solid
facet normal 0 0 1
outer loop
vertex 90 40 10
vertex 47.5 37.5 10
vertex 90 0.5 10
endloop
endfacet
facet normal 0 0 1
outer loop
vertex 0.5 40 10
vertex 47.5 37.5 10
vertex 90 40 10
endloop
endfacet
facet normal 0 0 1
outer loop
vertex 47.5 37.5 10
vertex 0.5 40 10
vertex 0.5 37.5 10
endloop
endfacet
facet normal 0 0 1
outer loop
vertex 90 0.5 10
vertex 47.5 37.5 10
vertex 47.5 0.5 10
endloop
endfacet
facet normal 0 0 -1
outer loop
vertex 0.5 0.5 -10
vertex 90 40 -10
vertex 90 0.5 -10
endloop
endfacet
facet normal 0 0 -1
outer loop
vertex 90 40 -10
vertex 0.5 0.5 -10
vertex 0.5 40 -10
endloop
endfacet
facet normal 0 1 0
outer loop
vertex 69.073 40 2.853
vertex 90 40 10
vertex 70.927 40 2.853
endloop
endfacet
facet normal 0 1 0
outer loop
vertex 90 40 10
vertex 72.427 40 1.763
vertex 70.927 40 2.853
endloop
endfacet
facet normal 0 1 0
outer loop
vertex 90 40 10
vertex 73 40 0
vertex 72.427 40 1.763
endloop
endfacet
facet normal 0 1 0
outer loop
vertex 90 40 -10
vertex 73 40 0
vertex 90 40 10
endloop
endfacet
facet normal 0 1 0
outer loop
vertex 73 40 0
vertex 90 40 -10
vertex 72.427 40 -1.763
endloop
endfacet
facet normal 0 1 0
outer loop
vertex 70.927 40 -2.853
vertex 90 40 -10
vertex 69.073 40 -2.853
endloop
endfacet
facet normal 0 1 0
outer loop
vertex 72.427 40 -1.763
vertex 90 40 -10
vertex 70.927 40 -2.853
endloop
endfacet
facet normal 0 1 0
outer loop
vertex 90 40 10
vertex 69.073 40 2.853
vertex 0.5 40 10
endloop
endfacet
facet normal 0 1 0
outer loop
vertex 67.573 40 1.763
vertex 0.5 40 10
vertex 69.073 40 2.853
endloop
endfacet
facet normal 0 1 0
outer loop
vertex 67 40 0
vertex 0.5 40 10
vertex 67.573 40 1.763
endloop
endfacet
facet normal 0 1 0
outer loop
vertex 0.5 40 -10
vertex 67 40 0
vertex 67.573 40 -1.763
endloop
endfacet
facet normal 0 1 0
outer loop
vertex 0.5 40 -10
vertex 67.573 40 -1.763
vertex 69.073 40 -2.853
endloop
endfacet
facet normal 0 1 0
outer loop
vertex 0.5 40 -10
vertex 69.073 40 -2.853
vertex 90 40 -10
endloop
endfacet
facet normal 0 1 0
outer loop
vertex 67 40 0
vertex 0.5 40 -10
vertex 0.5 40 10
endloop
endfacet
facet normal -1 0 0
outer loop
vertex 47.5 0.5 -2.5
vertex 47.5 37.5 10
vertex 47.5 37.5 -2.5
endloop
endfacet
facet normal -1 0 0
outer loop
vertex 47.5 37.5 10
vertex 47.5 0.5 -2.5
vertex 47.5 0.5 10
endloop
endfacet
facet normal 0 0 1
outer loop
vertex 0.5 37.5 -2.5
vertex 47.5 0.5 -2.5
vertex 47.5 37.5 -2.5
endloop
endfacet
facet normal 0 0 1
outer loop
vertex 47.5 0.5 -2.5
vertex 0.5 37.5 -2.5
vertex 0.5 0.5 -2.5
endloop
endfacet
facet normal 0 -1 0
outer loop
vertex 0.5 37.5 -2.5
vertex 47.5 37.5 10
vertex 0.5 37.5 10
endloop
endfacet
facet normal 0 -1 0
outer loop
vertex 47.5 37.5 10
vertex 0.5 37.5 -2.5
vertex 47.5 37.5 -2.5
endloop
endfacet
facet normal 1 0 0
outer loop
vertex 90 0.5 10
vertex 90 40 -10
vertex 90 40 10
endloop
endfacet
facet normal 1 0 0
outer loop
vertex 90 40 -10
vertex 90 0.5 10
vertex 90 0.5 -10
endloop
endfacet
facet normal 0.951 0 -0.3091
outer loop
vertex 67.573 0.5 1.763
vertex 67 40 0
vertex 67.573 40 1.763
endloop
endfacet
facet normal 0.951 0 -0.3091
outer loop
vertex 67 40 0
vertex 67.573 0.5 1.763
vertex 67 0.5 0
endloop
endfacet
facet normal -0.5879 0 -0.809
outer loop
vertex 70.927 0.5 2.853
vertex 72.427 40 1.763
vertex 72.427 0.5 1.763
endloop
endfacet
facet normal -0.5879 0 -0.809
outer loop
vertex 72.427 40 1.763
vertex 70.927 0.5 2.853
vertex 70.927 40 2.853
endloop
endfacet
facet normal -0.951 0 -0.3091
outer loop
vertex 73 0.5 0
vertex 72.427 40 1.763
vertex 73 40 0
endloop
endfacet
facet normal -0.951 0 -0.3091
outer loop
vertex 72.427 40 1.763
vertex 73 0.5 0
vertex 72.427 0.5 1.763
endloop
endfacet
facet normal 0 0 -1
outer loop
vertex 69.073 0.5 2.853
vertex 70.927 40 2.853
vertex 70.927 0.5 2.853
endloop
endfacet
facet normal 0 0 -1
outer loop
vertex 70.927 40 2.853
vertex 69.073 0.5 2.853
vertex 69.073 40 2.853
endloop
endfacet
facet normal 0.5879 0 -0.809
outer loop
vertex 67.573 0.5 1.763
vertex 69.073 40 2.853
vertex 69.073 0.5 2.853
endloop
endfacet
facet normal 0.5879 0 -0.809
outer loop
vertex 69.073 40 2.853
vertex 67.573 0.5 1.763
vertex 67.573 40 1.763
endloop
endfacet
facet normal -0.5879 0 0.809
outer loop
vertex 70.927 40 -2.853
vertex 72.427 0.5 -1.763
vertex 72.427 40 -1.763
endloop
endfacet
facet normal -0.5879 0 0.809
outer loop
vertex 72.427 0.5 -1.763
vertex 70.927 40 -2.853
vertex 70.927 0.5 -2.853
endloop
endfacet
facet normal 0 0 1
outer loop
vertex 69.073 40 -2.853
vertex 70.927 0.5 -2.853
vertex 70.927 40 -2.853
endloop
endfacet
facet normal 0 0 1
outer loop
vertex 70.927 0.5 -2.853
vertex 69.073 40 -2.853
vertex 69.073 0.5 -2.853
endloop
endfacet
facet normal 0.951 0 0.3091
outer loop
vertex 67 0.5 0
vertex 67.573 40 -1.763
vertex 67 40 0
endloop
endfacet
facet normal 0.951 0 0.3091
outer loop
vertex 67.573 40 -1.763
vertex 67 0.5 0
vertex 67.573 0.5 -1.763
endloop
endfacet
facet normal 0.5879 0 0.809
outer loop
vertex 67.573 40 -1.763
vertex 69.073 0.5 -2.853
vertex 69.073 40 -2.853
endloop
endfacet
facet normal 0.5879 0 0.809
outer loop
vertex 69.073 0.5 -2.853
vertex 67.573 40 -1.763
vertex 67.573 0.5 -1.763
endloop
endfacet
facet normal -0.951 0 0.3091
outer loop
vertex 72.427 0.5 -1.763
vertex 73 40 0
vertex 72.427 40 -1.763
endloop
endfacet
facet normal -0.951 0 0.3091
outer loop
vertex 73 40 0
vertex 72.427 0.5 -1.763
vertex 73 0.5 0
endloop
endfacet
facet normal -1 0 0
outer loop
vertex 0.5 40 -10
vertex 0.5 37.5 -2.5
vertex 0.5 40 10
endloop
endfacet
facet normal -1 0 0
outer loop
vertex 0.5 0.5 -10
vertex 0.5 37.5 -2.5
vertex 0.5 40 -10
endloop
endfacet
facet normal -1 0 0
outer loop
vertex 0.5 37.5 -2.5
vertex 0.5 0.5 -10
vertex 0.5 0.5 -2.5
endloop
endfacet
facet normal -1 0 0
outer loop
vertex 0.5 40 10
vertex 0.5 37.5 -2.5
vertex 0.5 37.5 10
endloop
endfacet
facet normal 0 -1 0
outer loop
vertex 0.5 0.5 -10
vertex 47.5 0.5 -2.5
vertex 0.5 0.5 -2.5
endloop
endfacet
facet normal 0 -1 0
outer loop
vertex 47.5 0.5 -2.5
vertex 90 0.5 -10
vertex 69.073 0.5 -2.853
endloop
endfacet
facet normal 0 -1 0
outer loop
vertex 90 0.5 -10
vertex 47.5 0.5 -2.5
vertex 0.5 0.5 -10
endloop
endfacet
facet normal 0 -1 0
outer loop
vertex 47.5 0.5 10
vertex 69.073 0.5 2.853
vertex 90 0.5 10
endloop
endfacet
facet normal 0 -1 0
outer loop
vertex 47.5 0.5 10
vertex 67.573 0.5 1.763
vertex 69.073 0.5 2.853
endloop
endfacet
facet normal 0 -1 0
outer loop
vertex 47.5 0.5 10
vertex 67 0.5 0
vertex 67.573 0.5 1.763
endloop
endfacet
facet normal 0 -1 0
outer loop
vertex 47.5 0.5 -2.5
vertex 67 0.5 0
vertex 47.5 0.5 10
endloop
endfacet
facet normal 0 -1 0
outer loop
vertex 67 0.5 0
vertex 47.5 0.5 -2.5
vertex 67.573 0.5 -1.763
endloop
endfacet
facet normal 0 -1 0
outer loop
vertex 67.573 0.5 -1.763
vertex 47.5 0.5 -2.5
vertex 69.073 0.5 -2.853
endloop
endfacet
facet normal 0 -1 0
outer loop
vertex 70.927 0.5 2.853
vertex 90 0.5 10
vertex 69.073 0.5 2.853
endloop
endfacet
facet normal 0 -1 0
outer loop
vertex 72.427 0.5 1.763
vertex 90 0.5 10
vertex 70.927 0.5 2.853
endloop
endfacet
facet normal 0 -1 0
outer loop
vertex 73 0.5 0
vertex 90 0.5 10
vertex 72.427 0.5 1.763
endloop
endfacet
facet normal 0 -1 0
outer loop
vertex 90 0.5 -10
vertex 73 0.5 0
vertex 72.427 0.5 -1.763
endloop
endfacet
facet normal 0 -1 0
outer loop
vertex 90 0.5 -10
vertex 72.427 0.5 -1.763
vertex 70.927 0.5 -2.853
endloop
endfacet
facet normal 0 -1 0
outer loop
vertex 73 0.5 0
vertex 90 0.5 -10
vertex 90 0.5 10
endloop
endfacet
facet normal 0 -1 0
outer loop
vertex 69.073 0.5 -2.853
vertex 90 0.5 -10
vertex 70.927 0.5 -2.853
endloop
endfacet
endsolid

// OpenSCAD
module body(){
        //body dims
    bodyLength = 100;
    bodyHeight = 80;
    bodyDepth = 20;

    //Axles
    axLength = bodyHeight + 40;
    axr1 = 3;
    axr2 = 3;


    bodyArray = [bodyLength,bodyHeight,bodyDepth];


    difference(){

        cube(bodyArray,center=true);
        translate([0,0,5])
            cube([95,75,15],center=true);

    }
    //bottom
    difference(){
        translate([50-0.0001,-40,-10])
            cube([40,80,20]);
        rotate([90,0,0])
            translate([70,0,-60])
                cylinder(axLength,axr1,axr2);
    }
    difference(){
        //axle holes
        translate([-90+0.0001,-40,-10])
            cube([40,80,20]);
        rotate([90,0,0])
            translate([-70,0,-60])
                cylinder(axLength,axr1,axr2);
    }

}



difference(){
    body();
    cube([1,1000,100],center=true);   
    cube([1000,1,100],center=true);
    translate([0,-100,-100])
        cube([100,100,300]);
    translate([-100,0,-100])
        cube([100,100,300]);
    translate([-100,-100,-100])
        cube([100,100,300]);
}






    
